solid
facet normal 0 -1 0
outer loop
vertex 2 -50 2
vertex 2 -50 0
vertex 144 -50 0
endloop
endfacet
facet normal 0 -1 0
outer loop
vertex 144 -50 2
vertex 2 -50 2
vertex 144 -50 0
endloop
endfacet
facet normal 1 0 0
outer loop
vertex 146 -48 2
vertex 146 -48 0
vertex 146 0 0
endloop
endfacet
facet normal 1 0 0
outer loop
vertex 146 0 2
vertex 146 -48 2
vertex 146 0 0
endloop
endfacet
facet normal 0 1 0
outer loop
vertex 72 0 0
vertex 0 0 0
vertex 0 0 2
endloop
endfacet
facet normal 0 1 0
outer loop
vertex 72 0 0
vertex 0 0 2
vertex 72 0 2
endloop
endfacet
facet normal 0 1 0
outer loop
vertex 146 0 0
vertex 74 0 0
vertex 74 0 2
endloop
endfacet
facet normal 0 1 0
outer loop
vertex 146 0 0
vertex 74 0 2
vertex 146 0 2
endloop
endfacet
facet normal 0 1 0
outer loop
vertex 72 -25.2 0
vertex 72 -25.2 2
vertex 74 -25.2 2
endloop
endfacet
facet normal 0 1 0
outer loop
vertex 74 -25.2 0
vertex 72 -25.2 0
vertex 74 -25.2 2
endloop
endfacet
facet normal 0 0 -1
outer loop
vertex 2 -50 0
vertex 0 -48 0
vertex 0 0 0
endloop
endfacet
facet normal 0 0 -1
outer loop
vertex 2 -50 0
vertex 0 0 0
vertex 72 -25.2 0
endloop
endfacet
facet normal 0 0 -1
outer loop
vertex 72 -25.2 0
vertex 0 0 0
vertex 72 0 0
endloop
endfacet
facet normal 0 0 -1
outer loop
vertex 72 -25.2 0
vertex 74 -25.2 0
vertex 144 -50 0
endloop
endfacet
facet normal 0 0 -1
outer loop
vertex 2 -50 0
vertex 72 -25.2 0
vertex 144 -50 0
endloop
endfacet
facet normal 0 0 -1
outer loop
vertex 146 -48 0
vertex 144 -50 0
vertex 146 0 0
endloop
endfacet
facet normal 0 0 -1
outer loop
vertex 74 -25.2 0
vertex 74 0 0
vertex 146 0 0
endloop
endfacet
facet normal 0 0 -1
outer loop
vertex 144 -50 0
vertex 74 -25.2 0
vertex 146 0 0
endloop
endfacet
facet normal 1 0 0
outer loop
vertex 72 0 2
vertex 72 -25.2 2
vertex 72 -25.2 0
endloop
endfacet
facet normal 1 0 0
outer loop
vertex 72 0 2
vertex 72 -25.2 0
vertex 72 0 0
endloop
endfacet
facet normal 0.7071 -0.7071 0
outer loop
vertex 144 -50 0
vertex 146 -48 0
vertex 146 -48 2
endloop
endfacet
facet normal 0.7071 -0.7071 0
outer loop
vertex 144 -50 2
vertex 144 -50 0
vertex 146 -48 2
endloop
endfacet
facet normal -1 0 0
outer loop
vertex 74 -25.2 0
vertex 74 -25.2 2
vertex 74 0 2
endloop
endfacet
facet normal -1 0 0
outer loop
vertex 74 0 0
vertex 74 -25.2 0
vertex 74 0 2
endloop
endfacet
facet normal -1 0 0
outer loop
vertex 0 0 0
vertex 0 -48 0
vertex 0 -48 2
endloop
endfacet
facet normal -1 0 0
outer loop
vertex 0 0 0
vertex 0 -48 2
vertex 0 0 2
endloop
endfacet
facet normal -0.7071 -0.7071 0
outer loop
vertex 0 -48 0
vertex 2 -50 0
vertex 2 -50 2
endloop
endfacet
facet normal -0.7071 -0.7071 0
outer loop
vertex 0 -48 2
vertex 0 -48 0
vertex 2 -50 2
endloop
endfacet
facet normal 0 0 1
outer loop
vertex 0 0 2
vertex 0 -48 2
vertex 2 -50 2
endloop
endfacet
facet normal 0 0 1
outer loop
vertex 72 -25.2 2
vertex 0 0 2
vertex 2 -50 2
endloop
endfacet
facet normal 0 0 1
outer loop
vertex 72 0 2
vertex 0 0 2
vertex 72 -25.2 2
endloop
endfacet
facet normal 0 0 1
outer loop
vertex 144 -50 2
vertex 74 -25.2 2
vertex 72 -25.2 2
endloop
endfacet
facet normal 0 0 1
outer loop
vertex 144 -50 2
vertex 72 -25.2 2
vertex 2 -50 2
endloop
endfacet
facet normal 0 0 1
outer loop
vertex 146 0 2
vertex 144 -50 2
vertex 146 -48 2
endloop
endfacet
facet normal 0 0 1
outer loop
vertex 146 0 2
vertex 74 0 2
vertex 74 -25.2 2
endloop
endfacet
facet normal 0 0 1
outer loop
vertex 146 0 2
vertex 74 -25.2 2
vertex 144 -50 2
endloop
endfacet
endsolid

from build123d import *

# Parameters (mm, degrees)
SKETCH_1_W          = 146
SKETCH_1_H          = 50
EXTRUDE_1_DEPTH     = 2
CHAMFER_1_SIZE      = 2
SKETCH_2_W          = 2
SKETCH_2_H          = 25.2
CUT_EXTRUDE_1_DEPTH = 155.337292966


with BuildPart() as part:
    # 草图1 → 凸台-拉伸1 (new body)
    with BuildSketch(Plane.XY):
        with Locations((73, -25)):
            Rectangle(SKETCH_1_W, SKETCH_1_H)
    extrude(amount=EXTRUDE_1_DEPTH)

    # 倒角1
    chamfer_1_edges = [part.edges().sort_by_distance(p)[0] for p in [
        (146, -50, 1),
        (0, -50, 1),
    ]]
    chamfer(chamfer_1_edges, length=CHAMFER_1_SIZE)

    # 草图2 → 切除-拉伸1 (cut, through all)
    with BuildSketch(Plane.XY.offset(2)):
        with Locations((73, -12.6)):
            Rectangle(SKETCH_2_W, SKETCH_2_H)
    extrude(amount=-CUT_EXTRUDE_1_DEPTH, mode=Mode.SUBTRACT)


solid = part.part
